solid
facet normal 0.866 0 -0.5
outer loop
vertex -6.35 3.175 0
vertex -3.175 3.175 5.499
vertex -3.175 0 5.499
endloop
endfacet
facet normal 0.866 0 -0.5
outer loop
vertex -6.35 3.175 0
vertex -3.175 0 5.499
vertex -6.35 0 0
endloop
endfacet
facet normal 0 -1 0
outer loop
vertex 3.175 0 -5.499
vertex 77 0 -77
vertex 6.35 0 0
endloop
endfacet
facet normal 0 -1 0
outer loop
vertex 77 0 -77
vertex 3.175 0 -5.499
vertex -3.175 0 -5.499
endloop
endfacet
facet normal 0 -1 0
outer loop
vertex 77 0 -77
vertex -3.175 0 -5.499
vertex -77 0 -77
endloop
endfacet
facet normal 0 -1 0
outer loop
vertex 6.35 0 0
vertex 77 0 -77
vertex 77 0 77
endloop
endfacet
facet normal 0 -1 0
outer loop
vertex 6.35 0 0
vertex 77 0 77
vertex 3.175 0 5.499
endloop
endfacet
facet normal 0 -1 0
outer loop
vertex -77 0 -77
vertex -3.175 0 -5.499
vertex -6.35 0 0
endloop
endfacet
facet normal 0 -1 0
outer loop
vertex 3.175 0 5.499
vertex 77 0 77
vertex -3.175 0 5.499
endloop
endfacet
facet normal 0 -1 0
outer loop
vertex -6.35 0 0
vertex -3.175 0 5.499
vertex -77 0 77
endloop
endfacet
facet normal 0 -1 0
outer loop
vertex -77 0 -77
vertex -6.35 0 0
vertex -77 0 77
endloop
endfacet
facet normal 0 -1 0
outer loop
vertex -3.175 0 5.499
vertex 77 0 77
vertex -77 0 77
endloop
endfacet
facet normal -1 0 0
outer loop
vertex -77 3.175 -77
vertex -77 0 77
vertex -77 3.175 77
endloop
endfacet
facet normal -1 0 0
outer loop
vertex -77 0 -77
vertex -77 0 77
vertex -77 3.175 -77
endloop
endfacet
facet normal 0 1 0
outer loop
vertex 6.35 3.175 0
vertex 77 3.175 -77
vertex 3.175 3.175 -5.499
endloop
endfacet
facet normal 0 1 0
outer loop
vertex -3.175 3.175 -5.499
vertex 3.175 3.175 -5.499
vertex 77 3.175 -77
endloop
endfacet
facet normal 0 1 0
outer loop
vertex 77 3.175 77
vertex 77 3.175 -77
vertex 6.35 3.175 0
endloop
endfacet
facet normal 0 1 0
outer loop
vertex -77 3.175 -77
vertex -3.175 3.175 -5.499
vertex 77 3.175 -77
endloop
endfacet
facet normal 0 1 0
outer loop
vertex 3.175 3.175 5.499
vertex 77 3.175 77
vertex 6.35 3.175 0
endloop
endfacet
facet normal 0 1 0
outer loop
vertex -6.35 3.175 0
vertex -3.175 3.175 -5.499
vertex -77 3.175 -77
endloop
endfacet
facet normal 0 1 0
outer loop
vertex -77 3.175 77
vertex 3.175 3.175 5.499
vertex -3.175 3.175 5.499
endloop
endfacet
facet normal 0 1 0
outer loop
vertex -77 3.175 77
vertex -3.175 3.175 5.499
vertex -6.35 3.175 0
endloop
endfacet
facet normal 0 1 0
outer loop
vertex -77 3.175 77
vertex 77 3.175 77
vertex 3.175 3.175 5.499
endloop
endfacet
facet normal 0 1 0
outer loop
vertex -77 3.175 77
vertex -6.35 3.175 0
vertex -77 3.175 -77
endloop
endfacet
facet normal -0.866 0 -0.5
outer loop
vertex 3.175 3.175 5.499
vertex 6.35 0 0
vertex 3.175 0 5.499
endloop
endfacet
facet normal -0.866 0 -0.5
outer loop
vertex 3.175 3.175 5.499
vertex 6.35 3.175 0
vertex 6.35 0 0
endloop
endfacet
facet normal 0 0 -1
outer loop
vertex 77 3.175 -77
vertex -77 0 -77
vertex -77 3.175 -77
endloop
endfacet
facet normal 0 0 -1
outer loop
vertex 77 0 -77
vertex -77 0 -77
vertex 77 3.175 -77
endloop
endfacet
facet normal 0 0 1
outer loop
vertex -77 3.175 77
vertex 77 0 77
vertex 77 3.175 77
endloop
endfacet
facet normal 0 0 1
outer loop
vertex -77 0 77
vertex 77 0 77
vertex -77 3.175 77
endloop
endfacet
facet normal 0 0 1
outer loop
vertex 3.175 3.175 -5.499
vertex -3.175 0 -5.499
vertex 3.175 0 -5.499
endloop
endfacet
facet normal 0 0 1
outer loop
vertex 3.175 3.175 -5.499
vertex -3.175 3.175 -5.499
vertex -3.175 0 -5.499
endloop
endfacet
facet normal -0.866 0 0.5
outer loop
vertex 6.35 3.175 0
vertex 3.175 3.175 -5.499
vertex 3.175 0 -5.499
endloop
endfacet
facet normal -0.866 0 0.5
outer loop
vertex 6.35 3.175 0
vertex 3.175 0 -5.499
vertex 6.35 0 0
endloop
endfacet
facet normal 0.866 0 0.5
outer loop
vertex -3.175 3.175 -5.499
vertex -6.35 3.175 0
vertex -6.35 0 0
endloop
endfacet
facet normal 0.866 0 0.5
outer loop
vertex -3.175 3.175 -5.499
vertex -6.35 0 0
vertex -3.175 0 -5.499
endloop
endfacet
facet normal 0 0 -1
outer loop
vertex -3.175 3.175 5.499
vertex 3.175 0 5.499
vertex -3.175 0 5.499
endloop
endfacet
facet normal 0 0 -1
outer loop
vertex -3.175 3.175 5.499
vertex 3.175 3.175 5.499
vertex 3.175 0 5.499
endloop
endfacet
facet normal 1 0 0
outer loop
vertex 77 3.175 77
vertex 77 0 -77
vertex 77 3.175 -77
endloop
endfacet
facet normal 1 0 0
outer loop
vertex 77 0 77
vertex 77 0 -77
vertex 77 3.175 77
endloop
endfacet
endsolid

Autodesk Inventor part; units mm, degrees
sketch "Sketch1" plane through (0, 0, 0) normal (0, 1, 0) x (-1, 0, 0)
  circle A0 centre (0, 0) radius 76.2
  line L0 (-77.0001, 77.0001) -> (77.0001, 77.0001)
  line L1 (77.0001, 77.0001) -> (77.0001, -77.0001)
  line L2 (77.0001, -77.0001) -> (-77.0001, -77.0001)
  line L3 (-77.0001, -77.0001) -> (-77.0001, 77.0001)
  line L4 (-77.0001, 77.0001) -> (77.0001, -77.0001) construction
  line L5 (77.0001, 77.0001) -> (-77.0001, -77.0001) construction
  dimension "d0" = 152.4
  dimension "d7" = 154.0002
  dimension "d8" = 154.0002
extrude "Extrusion1" add sketch "Sketch1" along normal blind 3.175 contours A0 | L0 L1 L2 L3
sketch "Sketch2" plane through (0, 3.175, 0) normal (0, 1, 0) x (1, 0, 0)
  line L0 (0, 0) -> (-6.35, 0)
  line L1 (-6.35, 0) -> (-3.175, 5.4993)
  line L2 (-3.175, 5.4993) -> (3.175, 5.4993)
  line L3 (3.175, 5.4993) -> (6.35, 0)
  line L4 (6.35, 0) -> (3.175, -5.4993)
  line L5 (3.175, -5.4993) -> (-3.175, -5.4993)
  line L6 (-3.175, -5.4993) -> (-6.35, 0)
  dimension "d4" = 6.35
extrude "Extrusion2" cut sketch "Sketch2" against normal blind 3.175
ref_plane "Work Plane1" through (0, 0, 77.0001) normal (1, 0, 0) x (0, 0, -1)
sketch "Sketch4" plane through (0, 3.175, 0) normal (0, 1, 0) x (1, 0, 0)
  circle A0 centre (0, 0) radius 7.8134
ref_plane "Work Plane2" through (0, 0, -77.0001) normal (-1, 0, 0) x (0, 0, 1)
ref_plane "Work Plane3" through (-77.0001, 0, 0) normal (0, 0, 1) x (1, 0, 0)
properties part number "TurretGear"
